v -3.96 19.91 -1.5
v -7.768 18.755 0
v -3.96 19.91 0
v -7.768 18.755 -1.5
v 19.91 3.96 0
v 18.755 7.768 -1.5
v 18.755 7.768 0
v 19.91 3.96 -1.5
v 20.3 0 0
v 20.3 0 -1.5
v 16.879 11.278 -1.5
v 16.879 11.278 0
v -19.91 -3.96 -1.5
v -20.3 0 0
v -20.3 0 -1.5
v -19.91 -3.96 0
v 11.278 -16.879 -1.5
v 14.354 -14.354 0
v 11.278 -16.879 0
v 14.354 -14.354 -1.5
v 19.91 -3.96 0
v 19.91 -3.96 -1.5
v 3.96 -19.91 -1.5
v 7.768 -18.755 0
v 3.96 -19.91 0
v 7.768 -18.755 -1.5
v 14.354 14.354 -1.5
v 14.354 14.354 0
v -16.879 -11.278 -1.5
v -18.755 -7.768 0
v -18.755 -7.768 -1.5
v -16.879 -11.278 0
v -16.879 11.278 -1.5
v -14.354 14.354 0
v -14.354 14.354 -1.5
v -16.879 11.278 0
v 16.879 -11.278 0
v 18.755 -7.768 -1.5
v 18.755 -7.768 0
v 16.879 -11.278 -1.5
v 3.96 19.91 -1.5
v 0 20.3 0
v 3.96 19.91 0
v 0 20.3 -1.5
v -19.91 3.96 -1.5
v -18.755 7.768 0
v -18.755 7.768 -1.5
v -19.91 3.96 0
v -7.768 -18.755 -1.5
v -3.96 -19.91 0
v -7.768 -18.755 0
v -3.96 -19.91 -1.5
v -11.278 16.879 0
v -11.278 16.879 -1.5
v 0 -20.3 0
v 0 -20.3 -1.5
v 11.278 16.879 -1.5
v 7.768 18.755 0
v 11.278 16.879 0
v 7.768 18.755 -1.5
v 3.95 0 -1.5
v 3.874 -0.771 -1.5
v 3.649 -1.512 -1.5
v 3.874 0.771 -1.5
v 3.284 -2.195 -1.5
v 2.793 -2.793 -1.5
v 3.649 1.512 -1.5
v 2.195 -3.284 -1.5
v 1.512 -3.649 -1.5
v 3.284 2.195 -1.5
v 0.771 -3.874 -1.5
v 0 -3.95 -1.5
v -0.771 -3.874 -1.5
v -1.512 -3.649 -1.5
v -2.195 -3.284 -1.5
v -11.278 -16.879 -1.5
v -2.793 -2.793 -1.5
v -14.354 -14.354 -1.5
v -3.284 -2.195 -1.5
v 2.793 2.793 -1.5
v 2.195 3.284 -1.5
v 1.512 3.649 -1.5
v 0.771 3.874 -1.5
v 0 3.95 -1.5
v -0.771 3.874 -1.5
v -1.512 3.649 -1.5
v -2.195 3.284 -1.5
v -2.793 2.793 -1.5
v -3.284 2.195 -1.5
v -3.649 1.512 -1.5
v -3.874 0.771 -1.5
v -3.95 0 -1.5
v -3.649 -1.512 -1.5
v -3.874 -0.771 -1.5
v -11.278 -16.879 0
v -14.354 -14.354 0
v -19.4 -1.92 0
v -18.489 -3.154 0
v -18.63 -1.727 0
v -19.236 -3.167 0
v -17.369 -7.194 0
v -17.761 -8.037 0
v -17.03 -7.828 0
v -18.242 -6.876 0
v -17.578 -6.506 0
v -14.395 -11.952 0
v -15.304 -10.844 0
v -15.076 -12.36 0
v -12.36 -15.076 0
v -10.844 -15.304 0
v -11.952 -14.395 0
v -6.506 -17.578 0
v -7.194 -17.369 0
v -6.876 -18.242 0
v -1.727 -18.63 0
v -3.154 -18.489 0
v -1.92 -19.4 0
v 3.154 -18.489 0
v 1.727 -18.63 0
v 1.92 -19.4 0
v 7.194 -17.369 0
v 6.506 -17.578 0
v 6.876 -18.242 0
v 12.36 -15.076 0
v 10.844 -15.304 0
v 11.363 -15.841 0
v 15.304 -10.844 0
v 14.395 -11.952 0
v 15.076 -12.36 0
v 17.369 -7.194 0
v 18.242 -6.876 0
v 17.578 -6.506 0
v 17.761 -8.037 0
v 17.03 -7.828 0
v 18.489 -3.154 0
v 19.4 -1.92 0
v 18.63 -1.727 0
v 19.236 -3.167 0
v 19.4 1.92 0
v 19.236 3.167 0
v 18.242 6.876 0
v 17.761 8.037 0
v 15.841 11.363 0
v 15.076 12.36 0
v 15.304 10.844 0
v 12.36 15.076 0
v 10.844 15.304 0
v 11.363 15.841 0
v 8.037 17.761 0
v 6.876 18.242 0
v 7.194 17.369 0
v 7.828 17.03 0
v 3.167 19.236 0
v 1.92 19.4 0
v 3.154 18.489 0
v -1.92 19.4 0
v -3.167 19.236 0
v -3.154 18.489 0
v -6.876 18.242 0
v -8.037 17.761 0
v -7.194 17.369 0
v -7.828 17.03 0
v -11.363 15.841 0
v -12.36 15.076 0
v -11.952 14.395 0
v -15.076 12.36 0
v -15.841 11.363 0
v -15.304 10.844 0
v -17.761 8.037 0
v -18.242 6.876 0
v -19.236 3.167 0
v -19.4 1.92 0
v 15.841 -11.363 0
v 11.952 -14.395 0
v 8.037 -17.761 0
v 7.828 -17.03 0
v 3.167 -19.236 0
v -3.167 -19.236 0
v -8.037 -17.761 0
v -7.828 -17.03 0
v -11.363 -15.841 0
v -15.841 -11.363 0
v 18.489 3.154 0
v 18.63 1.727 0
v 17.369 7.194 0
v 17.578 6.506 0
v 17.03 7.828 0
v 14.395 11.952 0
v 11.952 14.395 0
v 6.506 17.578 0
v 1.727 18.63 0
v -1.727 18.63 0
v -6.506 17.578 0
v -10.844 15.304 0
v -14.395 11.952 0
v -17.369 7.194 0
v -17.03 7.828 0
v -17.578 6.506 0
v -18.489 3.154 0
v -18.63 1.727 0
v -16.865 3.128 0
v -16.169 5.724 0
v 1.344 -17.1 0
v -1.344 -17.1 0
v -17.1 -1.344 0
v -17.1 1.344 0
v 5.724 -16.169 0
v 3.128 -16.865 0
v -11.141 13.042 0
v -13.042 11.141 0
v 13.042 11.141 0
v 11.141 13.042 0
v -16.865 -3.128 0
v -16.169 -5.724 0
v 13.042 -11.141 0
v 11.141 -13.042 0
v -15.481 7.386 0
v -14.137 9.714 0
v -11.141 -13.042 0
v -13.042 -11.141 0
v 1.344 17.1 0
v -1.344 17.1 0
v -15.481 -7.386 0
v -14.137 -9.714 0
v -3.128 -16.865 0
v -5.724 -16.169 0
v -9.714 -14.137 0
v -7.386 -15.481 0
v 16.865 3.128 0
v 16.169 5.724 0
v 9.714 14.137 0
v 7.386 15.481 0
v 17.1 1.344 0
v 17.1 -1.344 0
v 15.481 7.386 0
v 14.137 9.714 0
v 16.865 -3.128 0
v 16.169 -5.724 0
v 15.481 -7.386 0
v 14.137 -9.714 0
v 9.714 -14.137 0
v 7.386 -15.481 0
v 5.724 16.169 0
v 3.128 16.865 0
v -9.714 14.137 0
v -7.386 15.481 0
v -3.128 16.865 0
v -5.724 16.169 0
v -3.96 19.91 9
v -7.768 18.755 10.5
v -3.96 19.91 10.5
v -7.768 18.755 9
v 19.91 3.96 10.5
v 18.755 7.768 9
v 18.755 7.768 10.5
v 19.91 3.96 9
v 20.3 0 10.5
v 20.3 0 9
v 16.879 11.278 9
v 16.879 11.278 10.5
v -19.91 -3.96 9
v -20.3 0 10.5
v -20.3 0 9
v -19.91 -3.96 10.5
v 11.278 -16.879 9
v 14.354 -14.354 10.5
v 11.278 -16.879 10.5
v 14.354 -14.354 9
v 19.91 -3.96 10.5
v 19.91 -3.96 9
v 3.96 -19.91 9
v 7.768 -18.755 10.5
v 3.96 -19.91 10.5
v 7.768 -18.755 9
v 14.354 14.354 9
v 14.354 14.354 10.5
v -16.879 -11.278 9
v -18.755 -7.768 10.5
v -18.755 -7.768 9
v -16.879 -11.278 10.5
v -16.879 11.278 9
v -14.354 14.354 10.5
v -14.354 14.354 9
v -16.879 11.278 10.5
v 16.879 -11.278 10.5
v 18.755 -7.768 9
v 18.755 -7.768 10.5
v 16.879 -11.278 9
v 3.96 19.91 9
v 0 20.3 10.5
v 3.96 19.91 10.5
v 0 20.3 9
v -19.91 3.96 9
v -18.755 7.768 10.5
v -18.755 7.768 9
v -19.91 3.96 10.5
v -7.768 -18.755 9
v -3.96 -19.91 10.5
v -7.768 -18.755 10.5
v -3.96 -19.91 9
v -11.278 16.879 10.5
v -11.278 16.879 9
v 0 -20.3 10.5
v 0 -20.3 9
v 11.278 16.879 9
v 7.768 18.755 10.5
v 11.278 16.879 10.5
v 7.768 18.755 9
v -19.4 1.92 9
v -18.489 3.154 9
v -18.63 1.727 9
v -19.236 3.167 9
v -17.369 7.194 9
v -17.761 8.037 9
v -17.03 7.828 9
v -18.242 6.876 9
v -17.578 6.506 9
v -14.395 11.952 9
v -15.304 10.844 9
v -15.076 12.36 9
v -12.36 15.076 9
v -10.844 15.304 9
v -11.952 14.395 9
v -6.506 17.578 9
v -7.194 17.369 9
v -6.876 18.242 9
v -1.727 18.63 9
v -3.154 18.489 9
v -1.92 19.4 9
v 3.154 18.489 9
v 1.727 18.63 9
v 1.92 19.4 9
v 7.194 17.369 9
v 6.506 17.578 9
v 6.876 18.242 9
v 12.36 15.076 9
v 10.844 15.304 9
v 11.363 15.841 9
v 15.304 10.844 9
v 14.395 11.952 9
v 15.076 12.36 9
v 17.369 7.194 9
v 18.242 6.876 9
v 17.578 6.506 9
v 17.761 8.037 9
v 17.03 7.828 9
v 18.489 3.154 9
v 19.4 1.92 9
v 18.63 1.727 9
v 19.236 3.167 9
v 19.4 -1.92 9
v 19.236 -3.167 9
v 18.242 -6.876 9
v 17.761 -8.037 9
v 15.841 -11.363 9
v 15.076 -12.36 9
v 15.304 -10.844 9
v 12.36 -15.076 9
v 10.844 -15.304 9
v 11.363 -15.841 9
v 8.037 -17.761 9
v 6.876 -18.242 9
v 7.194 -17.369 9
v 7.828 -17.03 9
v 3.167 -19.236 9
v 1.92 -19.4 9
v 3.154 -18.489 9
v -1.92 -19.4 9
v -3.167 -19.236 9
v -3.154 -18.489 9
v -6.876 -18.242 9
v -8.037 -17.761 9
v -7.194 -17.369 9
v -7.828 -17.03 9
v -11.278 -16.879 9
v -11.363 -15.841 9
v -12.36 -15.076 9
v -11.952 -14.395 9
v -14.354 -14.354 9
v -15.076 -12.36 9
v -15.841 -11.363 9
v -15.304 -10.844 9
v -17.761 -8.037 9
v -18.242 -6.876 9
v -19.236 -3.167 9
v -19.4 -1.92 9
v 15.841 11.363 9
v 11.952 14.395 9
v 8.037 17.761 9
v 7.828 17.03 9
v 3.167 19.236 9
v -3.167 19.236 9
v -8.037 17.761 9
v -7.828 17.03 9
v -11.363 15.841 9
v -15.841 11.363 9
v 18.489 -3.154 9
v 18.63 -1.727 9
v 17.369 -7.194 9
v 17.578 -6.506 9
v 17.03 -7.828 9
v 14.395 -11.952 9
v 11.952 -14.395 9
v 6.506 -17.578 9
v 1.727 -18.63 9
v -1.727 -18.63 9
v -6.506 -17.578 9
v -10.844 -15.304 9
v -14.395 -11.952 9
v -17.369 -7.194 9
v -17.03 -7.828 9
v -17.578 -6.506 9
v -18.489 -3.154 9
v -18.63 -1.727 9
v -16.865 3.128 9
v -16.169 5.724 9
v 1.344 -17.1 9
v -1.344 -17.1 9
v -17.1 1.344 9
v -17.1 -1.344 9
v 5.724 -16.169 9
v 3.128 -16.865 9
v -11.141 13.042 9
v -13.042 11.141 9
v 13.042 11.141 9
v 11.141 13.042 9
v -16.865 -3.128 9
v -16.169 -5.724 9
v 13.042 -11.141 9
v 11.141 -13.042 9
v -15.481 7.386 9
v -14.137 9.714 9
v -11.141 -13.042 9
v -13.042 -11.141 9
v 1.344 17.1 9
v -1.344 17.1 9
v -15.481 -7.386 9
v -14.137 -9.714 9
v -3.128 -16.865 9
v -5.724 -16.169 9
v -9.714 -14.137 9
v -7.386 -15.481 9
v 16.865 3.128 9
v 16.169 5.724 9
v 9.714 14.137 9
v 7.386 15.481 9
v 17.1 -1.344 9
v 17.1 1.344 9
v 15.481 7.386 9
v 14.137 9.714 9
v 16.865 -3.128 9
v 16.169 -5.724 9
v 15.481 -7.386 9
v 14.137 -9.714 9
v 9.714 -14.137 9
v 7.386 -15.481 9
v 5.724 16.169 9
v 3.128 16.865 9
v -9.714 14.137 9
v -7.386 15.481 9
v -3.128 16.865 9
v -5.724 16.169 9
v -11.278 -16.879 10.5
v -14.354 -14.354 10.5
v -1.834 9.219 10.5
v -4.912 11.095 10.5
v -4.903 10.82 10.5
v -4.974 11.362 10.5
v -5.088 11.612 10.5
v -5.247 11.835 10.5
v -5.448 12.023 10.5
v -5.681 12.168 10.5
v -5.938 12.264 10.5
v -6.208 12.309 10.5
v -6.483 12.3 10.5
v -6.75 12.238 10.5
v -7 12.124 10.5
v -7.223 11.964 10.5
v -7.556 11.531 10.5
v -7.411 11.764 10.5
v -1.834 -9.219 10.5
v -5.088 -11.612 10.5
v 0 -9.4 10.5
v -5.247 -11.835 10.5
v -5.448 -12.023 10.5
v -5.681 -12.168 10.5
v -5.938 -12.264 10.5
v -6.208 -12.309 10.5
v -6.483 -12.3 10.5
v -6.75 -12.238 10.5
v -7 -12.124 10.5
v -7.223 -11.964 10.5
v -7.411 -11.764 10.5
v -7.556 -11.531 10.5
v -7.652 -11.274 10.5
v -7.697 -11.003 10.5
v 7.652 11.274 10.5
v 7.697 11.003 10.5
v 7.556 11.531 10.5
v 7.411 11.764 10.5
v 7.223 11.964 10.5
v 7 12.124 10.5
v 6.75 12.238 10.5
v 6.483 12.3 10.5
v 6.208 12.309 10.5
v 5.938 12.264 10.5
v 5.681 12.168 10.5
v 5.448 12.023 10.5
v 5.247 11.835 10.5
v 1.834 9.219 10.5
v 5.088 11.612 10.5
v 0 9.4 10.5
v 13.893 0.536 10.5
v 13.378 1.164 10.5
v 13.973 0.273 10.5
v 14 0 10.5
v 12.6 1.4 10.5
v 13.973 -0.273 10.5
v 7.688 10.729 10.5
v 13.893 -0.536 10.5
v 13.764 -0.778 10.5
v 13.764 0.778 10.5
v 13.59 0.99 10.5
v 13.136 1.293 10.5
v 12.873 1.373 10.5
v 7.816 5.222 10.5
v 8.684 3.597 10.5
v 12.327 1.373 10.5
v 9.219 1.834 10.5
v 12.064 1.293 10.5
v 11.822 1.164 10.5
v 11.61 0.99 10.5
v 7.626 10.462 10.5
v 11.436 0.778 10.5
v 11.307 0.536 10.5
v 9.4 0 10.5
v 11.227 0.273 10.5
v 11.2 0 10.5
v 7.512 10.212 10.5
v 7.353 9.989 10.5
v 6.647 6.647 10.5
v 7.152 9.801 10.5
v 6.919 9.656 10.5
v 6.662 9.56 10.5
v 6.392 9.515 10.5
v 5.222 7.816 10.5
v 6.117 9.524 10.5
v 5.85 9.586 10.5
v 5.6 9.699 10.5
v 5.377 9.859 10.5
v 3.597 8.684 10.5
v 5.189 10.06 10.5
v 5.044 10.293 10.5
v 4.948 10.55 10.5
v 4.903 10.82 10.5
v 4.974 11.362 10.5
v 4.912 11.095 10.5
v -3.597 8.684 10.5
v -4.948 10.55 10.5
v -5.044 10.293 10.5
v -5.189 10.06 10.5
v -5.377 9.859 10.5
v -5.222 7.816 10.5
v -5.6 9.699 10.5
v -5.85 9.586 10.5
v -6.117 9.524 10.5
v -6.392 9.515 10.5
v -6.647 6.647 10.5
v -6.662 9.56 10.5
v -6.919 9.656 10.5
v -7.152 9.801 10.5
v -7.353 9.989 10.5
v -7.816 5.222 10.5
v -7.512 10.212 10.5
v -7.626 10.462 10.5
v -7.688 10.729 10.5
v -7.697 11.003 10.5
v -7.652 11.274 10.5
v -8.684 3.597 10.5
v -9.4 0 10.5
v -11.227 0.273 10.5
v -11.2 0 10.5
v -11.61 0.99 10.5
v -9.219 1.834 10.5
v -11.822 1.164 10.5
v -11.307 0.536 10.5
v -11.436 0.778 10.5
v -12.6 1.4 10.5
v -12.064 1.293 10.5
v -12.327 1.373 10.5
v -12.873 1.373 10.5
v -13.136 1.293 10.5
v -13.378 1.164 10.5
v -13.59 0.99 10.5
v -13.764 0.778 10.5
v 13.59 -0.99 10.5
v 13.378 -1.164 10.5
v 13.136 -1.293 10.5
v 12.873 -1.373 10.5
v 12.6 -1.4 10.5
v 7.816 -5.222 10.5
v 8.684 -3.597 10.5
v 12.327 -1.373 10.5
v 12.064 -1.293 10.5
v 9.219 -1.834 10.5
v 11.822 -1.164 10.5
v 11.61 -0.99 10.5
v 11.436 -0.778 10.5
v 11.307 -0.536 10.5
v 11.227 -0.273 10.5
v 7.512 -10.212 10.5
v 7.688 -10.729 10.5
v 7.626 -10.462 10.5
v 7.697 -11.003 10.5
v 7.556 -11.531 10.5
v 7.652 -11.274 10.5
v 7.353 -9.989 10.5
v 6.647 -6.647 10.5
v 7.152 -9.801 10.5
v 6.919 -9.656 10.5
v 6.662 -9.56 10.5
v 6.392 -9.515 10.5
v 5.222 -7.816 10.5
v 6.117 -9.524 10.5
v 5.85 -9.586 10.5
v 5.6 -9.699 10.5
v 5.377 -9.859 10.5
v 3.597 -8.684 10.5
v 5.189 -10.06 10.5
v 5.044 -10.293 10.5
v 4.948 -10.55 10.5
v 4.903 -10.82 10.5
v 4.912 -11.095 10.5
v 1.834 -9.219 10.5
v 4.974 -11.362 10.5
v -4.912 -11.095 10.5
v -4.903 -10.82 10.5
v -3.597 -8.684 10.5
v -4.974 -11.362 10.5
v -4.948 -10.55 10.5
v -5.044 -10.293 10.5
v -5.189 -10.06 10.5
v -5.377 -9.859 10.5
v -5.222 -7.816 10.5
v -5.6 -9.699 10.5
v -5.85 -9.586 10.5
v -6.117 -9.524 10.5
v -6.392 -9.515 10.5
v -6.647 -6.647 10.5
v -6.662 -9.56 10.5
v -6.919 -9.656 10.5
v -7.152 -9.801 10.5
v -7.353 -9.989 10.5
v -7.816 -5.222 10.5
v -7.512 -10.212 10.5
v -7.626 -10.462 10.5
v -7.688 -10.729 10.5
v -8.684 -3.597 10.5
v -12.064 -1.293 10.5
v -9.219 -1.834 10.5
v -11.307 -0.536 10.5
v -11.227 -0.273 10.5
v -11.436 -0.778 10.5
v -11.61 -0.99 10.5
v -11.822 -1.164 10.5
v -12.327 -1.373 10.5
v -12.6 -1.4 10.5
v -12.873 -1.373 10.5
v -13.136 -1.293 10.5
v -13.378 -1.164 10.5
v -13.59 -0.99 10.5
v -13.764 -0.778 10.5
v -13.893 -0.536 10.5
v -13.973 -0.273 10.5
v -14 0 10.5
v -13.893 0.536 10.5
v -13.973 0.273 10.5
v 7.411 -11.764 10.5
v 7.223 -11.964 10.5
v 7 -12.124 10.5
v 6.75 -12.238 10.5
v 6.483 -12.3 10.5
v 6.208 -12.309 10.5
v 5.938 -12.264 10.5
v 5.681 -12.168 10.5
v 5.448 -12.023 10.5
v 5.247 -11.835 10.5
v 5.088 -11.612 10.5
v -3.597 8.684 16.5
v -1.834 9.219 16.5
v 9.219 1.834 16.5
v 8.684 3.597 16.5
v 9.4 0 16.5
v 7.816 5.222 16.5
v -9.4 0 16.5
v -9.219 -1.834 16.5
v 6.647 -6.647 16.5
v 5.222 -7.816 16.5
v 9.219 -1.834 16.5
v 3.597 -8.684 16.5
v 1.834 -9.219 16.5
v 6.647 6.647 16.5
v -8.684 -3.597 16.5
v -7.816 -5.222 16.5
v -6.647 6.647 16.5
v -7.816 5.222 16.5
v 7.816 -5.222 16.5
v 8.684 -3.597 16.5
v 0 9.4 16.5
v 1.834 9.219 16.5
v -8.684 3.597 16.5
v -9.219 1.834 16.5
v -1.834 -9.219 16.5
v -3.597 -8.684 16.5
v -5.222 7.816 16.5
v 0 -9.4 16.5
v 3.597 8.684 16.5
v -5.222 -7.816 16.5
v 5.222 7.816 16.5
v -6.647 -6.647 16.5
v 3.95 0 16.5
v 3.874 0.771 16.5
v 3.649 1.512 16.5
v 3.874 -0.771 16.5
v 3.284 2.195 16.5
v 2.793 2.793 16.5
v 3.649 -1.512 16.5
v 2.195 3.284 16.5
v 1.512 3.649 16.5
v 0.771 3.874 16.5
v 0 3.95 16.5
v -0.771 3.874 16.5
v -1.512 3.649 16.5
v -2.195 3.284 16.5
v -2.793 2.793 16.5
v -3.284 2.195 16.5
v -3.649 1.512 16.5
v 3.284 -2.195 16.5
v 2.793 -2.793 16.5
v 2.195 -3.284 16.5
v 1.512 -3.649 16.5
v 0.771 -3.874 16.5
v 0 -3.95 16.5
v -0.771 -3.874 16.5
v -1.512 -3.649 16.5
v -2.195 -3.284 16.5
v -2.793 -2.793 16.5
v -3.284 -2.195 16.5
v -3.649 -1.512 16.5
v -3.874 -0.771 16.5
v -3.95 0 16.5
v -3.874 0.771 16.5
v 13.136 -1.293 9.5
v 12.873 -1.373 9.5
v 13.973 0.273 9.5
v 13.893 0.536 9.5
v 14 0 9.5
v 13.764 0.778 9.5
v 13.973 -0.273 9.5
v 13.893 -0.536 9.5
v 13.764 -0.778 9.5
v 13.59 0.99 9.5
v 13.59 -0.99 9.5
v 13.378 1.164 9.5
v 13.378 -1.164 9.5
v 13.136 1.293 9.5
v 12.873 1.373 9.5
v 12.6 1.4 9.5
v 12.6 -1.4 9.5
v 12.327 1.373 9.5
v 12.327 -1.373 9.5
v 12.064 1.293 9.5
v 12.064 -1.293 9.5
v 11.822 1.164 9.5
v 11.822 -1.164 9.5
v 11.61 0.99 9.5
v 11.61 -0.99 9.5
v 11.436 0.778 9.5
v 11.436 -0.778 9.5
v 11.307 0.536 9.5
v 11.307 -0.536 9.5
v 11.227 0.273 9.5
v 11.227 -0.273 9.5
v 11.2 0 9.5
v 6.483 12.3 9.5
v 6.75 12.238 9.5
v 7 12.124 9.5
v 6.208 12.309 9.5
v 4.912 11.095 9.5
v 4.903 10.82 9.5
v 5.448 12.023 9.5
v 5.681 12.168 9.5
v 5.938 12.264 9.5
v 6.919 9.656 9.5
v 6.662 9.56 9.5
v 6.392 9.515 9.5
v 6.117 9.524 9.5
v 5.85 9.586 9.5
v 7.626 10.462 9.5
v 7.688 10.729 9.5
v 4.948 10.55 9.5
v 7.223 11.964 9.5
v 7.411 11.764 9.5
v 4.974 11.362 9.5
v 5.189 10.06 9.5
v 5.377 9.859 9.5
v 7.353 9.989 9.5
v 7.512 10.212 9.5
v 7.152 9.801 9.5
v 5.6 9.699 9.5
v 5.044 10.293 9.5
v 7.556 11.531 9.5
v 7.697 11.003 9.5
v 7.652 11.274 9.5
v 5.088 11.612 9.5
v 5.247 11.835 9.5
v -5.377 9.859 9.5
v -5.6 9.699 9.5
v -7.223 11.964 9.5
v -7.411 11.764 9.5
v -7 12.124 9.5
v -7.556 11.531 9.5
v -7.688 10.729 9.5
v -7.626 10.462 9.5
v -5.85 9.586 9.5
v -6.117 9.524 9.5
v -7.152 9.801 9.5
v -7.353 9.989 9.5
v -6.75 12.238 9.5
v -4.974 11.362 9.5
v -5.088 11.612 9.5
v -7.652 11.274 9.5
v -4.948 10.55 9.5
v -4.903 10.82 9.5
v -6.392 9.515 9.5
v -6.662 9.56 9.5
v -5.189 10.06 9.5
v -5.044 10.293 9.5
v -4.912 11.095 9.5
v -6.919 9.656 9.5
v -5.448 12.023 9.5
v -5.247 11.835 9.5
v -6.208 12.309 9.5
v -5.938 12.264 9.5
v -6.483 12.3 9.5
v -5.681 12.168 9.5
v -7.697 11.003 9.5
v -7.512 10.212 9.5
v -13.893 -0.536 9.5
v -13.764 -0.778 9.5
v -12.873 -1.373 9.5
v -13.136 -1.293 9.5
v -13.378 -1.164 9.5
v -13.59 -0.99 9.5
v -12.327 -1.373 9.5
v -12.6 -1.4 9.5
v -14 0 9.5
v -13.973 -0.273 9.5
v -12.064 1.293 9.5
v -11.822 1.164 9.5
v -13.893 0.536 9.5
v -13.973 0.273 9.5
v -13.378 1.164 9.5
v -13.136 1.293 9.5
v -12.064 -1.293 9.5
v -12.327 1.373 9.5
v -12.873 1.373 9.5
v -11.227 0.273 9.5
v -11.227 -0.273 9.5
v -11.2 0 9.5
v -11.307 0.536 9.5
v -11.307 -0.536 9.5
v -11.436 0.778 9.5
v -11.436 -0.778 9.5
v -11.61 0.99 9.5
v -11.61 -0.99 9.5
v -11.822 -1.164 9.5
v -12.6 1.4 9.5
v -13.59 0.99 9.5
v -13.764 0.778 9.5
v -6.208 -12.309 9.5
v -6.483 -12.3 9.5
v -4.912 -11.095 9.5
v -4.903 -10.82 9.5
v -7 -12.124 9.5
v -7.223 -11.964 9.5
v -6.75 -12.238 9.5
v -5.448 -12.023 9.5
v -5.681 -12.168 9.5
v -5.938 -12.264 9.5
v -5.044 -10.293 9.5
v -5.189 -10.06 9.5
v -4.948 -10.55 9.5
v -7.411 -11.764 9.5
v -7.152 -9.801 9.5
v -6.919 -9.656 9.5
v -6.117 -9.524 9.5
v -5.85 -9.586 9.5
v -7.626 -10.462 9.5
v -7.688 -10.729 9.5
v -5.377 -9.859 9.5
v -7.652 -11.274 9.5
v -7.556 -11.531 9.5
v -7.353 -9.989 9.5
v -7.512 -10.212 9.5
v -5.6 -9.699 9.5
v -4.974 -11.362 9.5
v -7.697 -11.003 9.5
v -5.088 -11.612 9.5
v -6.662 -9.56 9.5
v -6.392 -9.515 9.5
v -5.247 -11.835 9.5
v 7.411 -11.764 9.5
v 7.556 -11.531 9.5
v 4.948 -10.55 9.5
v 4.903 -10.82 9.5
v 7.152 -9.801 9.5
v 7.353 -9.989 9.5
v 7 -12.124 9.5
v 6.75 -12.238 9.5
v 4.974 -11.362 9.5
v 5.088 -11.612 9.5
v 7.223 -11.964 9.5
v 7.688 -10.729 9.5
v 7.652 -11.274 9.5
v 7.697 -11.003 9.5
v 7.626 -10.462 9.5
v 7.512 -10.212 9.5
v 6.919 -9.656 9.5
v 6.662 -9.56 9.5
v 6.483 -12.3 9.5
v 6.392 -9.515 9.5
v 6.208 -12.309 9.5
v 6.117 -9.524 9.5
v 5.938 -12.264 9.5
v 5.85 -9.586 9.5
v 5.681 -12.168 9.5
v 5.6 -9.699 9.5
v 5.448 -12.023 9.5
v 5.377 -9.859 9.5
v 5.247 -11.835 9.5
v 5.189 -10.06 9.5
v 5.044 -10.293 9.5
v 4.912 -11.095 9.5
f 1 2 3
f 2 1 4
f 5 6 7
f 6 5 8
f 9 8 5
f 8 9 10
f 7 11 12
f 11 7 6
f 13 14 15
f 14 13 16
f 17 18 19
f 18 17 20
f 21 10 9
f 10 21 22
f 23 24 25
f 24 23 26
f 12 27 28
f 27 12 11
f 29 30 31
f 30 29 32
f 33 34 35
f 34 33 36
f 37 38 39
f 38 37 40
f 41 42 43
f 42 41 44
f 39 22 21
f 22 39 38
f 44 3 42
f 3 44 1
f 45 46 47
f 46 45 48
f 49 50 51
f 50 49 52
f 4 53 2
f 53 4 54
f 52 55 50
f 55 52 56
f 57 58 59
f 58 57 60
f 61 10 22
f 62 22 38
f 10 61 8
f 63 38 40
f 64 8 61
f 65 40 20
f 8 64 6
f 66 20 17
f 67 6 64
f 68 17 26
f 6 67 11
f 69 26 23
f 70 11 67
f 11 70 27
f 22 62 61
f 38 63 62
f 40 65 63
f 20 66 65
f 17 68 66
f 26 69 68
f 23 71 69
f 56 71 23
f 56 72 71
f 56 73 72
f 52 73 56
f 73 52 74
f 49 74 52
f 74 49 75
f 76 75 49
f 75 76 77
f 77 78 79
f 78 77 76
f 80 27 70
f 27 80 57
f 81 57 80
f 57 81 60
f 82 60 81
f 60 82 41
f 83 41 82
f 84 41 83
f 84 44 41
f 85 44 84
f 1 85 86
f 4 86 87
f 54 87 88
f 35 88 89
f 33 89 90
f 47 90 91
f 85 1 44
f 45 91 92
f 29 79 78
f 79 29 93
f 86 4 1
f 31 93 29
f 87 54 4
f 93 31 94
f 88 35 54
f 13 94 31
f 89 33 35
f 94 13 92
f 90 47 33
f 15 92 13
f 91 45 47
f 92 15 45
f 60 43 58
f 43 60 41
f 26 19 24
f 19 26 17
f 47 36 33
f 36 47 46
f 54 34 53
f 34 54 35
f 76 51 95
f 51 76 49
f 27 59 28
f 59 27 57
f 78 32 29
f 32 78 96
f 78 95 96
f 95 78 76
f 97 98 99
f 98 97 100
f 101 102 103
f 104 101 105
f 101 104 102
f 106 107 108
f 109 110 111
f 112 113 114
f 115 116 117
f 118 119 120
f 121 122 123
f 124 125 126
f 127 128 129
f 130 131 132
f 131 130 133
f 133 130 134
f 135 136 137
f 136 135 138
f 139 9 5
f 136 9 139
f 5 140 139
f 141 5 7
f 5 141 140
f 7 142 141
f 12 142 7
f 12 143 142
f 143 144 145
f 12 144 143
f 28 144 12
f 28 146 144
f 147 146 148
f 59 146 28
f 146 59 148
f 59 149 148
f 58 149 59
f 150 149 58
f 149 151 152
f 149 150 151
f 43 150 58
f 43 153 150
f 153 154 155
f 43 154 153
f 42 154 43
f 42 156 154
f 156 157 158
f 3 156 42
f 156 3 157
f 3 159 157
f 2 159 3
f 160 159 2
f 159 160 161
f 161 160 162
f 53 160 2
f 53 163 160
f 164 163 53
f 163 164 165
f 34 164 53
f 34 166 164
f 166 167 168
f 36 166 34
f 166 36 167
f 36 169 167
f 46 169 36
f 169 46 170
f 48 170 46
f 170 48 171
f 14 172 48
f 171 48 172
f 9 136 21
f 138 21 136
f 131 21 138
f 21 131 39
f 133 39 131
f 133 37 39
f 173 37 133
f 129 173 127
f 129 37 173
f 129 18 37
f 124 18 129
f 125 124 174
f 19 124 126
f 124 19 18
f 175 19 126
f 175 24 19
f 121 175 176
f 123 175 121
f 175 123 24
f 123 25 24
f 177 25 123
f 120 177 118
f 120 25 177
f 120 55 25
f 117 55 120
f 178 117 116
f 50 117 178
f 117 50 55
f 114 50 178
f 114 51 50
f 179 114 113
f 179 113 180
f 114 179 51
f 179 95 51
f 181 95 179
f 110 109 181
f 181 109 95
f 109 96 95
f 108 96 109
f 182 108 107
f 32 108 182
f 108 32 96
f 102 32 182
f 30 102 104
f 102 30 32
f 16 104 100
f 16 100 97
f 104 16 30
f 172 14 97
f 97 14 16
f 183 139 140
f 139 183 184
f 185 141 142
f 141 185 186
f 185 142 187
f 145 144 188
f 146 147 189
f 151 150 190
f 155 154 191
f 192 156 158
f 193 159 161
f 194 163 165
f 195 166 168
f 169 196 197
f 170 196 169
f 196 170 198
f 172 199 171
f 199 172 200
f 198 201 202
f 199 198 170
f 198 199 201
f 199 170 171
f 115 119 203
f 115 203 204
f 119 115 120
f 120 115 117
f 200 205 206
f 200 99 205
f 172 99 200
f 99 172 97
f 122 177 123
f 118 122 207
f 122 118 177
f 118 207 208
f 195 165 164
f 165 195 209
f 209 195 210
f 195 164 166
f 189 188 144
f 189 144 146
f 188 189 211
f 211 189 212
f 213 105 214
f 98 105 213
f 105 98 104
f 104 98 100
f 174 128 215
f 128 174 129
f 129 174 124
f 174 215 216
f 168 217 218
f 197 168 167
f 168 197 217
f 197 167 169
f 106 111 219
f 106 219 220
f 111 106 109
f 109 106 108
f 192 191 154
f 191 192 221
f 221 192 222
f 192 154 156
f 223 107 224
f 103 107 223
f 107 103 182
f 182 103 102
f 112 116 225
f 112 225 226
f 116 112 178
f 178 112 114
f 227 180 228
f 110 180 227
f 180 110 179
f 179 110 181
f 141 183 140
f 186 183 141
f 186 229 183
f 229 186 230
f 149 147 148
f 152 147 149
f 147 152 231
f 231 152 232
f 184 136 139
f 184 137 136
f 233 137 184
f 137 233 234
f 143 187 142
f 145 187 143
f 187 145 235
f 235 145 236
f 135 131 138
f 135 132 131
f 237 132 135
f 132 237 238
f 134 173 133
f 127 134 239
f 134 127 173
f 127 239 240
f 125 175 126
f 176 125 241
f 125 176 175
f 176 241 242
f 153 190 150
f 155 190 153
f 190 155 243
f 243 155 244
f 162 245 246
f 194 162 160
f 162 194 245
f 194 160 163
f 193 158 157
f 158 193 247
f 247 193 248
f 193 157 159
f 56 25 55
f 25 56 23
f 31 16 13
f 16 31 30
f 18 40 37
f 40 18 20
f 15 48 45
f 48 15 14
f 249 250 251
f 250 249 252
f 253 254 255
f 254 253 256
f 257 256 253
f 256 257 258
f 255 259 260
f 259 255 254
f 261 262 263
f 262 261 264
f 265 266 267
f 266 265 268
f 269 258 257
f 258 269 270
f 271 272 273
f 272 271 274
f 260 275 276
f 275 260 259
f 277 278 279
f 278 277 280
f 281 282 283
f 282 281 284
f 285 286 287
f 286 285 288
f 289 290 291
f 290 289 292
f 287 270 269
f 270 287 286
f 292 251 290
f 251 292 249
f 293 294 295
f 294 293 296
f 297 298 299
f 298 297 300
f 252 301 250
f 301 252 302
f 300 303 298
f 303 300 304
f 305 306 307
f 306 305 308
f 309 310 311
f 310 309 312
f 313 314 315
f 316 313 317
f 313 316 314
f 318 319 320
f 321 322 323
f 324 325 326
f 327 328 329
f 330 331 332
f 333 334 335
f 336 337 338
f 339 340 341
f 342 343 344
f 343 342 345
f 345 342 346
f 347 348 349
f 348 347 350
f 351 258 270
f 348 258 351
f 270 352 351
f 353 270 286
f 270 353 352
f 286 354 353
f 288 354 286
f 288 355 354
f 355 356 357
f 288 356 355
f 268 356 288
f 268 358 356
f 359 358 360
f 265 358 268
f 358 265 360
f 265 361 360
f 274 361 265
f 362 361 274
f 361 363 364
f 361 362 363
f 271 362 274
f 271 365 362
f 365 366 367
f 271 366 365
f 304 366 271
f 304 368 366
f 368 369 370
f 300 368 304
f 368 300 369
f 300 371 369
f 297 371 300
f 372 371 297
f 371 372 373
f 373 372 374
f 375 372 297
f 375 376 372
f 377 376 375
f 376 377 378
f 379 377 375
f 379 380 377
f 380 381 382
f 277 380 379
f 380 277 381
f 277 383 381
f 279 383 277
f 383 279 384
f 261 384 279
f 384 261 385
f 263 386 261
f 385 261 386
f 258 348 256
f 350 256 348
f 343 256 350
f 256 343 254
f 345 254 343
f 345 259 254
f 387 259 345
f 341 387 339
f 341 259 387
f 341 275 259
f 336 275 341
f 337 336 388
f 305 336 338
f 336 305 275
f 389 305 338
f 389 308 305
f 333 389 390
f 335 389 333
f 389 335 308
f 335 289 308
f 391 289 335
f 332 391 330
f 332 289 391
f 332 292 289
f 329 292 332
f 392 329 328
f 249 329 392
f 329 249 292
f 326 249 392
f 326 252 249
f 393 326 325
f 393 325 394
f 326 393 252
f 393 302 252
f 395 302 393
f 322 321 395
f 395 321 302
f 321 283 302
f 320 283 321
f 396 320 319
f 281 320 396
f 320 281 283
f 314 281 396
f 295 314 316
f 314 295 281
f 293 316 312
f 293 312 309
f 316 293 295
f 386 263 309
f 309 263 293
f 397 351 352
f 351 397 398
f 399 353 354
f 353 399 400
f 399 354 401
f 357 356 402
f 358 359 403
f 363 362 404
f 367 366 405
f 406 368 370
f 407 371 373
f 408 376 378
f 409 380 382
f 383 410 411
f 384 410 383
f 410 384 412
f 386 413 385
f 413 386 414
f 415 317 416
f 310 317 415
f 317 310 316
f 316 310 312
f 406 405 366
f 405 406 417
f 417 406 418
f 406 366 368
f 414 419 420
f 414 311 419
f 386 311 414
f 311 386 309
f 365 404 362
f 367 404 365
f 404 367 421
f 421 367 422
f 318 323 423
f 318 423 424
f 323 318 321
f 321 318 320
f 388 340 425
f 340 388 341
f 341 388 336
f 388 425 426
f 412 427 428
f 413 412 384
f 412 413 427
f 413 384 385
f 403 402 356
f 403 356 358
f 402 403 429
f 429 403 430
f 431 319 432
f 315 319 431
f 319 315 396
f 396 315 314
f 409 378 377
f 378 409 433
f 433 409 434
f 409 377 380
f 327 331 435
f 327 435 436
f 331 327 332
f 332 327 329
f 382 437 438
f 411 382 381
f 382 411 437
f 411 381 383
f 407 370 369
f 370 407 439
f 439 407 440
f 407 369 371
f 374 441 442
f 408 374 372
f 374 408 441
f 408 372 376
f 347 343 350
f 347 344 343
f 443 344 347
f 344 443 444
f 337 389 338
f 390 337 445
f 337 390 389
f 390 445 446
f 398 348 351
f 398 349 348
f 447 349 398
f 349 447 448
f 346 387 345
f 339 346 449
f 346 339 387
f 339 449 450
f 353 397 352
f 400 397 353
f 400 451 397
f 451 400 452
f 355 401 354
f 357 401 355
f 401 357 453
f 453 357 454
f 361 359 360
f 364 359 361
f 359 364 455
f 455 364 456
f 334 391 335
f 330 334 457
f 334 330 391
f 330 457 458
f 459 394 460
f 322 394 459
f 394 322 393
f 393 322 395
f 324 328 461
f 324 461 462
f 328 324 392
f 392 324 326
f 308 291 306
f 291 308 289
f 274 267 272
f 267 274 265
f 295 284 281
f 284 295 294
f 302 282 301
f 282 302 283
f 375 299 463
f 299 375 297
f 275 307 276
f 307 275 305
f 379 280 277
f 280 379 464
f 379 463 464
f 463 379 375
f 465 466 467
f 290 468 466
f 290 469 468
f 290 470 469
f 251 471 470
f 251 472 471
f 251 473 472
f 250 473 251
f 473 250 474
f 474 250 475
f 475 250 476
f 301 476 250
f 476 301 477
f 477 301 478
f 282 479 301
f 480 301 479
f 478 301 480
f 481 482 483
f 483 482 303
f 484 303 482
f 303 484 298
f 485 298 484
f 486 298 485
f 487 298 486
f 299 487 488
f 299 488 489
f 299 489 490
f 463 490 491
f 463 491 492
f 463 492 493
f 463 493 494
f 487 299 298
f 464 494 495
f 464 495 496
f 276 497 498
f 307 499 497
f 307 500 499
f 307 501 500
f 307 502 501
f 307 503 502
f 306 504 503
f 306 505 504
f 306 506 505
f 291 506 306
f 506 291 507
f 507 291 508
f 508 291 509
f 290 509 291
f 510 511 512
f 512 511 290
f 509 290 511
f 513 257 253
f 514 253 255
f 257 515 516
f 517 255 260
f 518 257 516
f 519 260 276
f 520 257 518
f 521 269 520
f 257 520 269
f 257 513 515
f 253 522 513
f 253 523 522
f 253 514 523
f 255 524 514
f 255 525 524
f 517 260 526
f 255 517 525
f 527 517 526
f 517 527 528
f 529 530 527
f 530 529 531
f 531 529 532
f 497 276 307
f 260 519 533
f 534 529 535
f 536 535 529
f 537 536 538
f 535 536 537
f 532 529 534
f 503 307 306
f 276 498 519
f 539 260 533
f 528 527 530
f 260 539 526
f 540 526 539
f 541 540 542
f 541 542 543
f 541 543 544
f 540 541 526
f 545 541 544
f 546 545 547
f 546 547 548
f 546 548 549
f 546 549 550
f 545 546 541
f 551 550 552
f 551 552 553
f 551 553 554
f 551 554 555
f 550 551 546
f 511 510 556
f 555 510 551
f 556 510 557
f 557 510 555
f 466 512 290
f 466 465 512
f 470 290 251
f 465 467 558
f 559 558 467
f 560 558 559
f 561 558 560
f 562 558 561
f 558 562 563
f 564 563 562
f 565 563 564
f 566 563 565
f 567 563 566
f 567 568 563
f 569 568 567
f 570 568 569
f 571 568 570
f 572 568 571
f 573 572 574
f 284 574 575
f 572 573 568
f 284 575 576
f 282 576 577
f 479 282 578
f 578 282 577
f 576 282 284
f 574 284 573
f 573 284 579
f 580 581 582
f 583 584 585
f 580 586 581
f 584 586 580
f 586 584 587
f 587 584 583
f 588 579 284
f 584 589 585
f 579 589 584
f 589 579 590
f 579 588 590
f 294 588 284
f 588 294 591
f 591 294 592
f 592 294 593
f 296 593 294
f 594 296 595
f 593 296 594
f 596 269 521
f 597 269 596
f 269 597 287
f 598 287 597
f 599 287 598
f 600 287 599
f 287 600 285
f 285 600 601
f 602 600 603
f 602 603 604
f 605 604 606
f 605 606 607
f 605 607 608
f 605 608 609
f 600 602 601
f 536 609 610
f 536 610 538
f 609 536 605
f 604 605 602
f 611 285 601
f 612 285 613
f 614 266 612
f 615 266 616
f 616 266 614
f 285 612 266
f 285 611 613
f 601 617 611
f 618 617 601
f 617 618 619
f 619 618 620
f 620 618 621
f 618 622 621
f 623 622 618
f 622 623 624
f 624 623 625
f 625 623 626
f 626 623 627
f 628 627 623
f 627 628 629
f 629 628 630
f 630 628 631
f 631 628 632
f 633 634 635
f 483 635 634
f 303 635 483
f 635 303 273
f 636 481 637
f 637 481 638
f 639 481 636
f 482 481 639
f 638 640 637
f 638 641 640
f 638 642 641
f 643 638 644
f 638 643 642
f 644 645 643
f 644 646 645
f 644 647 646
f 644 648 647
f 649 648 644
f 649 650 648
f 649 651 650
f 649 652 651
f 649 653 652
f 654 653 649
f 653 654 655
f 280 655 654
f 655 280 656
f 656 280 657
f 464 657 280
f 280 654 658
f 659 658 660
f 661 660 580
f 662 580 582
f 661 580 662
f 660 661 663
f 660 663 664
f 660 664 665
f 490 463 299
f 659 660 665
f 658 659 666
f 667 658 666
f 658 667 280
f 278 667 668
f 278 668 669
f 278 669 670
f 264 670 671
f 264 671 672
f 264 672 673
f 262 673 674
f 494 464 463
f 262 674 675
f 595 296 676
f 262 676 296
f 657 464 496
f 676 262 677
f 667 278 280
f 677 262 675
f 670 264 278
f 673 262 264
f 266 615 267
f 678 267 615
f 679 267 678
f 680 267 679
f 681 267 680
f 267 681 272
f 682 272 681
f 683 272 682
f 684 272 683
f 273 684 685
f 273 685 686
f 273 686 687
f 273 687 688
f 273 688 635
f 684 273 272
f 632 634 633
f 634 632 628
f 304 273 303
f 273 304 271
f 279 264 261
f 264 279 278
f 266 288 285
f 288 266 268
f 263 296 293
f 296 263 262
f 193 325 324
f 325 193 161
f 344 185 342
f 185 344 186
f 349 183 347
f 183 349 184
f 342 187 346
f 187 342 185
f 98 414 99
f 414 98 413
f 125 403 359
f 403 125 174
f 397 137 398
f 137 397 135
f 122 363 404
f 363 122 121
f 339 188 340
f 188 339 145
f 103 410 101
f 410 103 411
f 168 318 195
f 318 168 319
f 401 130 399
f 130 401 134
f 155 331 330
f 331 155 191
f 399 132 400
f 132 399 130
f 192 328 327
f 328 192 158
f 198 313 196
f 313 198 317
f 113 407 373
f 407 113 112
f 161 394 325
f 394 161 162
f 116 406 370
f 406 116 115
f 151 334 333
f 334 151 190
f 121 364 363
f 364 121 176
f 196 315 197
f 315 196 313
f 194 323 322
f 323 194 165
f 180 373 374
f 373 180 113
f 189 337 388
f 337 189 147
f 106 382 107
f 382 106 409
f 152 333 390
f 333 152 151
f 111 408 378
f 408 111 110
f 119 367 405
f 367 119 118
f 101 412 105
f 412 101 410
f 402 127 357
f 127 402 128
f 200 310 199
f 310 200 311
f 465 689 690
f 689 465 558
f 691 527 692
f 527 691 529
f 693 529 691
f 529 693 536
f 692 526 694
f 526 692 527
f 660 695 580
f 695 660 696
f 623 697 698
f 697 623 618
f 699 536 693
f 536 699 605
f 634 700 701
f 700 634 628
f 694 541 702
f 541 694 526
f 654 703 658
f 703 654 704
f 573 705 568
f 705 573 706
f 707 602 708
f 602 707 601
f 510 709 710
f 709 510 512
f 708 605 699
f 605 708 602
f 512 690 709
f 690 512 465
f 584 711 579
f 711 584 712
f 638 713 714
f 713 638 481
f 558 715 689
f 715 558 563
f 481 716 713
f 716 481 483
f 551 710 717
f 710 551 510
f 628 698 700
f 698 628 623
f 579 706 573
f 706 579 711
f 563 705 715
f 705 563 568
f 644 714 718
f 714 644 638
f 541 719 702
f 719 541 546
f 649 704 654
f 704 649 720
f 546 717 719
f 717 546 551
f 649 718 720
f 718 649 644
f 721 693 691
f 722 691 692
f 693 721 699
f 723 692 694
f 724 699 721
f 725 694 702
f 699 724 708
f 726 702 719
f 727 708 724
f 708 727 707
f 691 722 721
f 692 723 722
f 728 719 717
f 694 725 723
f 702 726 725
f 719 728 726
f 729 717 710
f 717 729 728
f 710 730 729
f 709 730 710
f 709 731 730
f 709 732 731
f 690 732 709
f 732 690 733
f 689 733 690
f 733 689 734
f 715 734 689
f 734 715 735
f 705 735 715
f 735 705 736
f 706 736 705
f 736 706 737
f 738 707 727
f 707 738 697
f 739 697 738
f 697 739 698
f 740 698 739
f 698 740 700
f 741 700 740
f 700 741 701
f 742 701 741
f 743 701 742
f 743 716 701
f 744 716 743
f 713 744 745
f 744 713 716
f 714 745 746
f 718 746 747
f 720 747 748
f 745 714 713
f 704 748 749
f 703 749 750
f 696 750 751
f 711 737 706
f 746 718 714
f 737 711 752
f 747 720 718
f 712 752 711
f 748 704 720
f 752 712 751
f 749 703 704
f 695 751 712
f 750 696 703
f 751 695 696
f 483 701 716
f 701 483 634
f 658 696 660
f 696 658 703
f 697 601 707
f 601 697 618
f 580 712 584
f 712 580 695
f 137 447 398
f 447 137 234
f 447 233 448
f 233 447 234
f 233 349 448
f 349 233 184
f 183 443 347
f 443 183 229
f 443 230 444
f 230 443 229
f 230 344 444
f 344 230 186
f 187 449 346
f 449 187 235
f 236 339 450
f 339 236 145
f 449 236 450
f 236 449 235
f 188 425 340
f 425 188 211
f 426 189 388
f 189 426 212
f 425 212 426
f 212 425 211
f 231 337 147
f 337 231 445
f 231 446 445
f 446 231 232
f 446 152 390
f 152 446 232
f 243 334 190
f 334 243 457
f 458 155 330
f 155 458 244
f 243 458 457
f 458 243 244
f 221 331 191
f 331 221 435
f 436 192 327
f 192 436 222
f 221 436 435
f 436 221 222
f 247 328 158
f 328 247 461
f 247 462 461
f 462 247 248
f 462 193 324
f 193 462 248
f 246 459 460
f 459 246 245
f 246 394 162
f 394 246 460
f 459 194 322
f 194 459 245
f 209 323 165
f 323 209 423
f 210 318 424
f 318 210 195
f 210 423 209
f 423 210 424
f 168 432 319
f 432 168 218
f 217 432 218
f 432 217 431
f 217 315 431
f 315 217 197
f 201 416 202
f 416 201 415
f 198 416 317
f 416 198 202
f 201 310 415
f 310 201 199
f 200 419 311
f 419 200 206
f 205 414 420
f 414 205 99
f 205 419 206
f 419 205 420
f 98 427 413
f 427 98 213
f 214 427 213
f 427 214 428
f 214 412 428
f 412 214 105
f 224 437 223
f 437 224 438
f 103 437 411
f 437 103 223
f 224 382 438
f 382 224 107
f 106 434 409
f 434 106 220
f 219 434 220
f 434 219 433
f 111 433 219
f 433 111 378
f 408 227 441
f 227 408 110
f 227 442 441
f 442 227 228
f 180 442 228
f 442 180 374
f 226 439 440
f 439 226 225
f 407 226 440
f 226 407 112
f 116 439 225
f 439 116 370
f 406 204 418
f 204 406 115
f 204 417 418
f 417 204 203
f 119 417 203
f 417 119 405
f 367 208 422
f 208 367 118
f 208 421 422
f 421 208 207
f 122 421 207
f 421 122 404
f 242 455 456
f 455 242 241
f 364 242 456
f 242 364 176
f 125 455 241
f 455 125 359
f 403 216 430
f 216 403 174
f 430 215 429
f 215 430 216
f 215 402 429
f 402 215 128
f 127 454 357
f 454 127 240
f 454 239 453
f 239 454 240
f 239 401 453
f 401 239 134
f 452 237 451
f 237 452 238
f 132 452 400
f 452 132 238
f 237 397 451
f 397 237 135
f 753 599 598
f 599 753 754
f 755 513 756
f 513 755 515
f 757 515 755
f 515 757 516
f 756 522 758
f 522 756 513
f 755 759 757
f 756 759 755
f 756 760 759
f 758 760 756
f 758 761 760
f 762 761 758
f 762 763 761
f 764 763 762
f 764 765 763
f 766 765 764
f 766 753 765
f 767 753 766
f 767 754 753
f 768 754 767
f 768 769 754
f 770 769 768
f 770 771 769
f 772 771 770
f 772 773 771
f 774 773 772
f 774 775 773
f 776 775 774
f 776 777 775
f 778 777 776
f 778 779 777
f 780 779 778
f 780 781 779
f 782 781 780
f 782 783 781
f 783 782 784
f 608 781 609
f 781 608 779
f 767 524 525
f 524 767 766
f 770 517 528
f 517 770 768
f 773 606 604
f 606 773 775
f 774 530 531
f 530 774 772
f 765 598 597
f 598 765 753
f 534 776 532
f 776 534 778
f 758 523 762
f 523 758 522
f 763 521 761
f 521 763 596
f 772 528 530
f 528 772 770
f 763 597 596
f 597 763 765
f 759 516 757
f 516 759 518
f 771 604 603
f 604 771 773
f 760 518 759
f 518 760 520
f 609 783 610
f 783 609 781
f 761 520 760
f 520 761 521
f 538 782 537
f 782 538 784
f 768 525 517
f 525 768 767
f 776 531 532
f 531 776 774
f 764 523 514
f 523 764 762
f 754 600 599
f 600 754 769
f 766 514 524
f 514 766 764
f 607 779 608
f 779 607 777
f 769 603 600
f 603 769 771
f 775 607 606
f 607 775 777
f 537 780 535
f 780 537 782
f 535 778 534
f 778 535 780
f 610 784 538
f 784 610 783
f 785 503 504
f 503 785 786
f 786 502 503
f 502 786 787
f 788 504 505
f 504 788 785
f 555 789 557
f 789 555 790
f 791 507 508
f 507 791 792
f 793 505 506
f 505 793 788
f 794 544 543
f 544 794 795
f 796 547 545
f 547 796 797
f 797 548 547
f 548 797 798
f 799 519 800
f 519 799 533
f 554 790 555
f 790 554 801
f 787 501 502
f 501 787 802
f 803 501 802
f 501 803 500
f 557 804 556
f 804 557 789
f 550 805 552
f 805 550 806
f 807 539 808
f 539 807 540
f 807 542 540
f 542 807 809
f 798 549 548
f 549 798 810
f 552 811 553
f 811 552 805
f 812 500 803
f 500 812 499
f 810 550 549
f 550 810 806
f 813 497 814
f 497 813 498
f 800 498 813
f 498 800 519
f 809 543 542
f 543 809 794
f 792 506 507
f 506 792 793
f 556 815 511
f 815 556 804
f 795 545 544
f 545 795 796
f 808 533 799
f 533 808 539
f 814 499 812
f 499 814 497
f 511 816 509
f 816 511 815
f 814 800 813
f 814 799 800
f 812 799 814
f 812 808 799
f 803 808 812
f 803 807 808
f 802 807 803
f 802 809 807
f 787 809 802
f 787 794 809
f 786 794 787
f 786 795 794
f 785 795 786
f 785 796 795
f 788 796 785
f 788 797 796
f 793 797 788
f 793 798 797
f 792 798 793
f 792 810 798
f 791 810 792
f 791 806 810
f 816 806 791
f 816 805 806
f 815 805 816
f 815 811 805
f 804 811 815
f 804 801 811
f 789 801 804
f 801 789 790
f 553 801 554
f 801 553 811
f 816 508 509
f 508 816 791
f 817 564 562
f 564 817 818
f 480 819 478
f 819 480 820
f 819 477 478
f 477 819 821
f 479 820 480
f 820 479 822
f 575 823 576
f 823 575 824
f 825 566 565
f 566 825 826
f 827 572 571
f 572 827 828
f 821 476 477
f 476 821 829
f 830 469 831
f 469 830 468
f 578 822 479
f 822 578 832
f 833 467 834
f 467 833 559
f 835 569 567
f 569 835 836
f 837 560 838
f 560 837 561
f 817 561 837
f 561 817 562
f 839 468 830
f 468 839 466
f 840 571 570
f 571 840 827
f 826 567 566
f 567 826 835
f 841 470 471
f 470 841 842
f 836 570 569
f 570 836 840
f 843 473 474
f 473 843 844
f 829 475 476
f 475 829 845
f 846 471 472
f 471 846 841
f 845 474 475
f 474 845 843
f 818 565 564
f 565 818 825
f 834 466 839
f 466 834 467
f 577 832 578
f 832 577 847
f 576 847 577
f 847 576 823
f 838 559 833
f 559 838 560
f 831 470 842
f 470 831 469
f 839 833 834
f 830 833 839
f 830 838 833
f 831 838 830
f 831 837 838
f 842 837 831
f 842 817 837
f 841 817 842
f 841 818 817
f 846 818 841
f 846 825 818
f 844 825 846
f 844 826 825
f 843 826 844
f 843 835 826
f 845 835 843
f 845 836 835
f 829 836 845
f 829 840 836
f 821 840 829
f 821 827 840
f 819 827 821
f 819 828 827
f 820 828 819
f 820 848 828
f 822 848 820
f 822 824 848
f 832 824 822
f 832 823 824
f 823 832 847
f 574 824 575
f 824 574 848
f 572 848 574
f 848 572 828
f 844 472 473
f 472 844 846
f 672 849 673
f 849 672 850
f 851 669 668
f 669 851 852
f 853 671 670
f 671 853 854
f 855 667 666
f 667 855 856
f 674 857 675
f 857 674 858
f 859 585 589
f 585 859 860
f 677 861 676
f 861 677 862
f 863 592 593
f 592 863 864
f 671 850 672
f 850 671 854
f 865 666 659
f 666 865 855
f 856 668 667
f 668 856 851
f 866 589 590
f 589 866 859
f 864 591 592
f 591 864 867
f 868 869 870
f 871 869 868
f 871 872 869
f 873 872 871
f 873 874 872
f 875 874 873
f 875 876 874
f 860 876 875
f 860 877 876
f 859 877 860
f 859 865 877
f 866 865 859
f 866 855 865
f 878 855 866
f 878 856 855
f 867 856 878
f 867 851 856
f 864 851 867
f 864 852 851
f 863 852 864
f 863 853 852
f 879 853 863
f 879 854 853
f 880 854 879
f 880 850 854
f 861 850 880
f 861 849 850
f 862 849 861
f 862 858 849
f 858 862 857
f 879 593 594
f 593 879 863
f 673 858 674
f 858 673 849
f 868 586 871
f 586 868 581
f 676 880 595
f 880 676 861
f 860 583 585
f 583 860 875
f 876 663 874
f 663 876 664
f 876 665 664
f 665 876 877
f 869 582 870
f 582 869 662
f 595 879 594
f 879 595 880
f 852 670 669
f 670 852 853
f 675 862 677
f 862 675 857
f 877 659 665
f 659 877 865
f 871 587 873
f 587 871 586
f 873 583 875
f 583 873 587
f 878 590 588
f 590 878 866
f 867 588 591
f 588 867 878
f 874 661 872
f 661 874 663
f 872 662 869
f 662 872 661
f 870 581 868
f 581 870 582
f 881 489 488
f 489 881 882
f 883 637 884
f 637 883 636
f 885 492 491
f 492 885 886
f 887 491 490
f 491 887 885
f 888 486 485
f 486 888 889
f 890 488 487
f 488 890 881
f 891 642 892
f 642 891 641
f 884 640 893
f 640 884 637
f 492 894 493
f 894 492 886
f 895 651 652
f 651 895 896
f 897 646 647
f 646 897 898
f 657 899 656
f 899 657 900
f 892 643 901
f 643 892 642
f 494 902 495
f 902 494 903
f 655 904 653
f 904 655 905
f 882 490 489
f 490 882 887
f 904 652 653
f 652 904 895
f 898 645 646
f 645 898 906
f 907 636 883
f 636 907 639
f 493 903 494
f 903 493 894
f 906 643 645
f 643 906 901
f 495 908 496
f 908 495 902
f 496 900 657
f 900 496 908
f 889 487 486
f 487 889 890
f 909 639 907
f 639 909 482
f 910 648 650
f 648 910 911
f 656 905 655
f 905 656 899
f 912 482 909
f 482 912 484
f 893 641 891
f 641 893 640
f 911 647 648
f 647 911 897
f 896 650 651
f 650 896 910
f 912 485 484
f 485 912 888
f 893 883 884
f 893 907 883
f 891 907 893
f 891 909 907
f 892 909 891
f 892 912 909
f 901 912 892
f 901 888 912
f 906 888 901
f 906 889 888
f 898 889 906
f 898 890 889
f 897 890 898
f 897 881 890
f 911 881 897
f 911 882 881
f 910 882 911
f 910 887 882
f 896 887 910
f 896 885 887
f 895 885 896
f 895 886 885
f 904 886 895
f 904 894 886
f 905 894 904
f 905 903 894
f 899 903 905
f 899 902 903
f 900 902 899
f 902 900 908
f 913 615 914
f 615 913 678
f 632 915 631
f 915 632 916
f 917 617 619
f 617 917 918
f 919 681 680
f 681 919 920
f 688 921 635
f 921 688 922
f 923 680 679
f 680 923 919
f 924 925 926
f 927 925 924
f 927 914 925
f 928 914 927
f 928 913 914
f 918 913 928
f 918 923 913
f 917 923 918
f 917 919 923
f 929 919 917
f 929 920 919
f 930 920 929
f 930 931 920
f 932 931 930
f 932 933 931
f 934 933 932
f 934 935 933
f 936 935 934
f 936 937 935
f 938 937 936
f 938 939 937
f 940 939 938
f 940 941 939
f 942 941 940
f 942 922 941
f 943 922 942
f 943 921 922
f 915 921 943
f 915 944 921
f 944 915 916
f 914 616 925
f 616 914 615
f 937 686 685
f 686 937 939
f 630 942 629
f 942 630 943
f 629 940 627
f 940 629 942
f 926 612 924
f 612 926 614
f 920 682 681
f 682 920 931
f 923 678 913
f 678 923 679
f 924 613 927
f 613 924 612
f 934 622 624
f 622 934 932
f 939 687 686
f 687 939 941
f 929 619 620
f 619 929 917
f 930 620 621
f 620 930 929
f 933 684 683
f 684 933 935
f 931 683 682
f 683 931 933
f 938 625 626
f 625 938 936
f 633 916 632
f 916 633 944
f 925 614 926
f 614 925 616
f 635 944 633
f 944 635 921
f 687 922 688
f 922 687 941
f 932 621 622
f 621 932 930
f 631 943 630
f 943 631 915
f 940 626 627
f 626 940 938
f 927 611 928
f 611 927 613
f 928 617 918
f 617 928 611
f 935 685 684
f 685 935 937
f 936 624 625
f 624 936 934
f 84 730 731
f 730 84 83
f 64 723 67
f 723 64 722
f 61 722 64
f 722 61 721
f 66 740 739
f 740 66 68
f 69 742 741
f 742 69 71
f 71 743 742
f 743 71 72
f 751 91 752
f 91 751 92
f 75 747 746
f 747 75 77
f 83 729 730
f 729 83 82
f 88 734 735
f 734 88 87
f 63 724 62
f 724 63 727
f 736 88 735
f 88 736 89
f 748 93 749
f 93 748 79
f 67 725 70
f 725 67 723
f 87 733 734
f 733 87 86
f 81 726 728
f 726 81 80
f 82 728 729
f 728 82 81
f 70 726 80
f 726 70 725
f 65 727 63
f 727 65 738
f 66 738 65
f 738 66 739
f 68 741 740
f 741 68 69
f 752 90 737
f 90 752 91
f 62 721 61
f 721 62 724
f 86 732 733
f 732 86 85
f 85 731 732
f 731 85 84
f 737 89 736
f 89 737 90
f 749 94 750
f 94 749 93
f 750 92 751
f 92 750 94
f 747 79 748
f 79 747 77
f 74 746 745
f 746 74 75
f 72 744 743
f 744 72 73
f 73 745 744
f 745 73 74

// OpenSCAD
$fn = 32;

// ----------------------------------------------------------------------
// Timing pulley: HTD5 24T, pitch 5 mm, 40.6 mm x 18 mm
// ----------------------------------------------------------------------

// --- parameters (mm) ---
pitch_mm = 5;             // belt pitch
tooth_count = 24;         // number of grooves
width = 9;                // belt width between the flanges
tip_d = 37.6;             // tip circle diameter
root_d = 35.4;            // groove bottom diameter
groove_h = 1.1;           // groove depth
tooth_w = 3.2;            // groove width at the tip circle
side_d = 40.6;            // flange diameter
side_t = 1.5;             // flange thickness
spigot_d = 33.8;          // flange spigot, sunk into the rim
spigot_h = 1.2;           // spigot depth into the rim
hub_bore = 7.9;           // shaft bore
hub_d = 18.8;             // hub diameter
hub_h = 6;                // hub above the flange
bottom_z = -1.5;          // lowest point of the pulley
top_z = 16.5;             // highest point of the pulley
ring_d = 2.8;             // clamp screw hole
ring_r = 12.6;            // clamp screw radius

module rim() {
  cylinder(h = width, d = tip_d);
}

module groove_cutter() {
  /* belt tooth groove: deeper than wide, cut through the belt width */
  translate([root_d / 2, 0, 0])
    linear_extrude(height = width)
      polygon(points = [[-0.6, -tooth_w * 0.42], [groove_h + 0.6, -tooth_w * 0.6],
                        [groove_h + 0.6, tooth_w * 0.6], [-0.6, tooth_w * 0.42]]);
}

module flanges() {
  translate([0, 0, -side_t]) cylinder(h = side_t, d = side_d);
  translate([0, 0, width]) cylinder(h = side_t, d = side_d);
  translate([0, 0, -spigot_h]) cylinder(h = spigot_h + 0.6, d = spigot_d);
  translate([0, 0, width - 0.6]) cylinder(h = spigot_h + 0.6, d = spigot_d);
}

module hub() {
  translate([0, 0, bottom_z]) cylinder(h = top_z - bottom_z, d = hub_d);
}

difference() {
  union() {
    rim();
    hub();
    flanges();
  }
  for (i = [0 : tooth_count - 1]) rotate([0, 0, i * 360 / tooth_count]) groove_cutter();
  translate([0, 0, bottom_z - 1]) cylinder(h = top_z - bottom_z + 2, d = hub_bore);
  for (i = [0 : 5]) rotate([0, 0, i * 60]) translate([ring_r, 0, top_z - hub_h - 1])
    cylinder(h = hub_h + 2, d = ring_d);
}
